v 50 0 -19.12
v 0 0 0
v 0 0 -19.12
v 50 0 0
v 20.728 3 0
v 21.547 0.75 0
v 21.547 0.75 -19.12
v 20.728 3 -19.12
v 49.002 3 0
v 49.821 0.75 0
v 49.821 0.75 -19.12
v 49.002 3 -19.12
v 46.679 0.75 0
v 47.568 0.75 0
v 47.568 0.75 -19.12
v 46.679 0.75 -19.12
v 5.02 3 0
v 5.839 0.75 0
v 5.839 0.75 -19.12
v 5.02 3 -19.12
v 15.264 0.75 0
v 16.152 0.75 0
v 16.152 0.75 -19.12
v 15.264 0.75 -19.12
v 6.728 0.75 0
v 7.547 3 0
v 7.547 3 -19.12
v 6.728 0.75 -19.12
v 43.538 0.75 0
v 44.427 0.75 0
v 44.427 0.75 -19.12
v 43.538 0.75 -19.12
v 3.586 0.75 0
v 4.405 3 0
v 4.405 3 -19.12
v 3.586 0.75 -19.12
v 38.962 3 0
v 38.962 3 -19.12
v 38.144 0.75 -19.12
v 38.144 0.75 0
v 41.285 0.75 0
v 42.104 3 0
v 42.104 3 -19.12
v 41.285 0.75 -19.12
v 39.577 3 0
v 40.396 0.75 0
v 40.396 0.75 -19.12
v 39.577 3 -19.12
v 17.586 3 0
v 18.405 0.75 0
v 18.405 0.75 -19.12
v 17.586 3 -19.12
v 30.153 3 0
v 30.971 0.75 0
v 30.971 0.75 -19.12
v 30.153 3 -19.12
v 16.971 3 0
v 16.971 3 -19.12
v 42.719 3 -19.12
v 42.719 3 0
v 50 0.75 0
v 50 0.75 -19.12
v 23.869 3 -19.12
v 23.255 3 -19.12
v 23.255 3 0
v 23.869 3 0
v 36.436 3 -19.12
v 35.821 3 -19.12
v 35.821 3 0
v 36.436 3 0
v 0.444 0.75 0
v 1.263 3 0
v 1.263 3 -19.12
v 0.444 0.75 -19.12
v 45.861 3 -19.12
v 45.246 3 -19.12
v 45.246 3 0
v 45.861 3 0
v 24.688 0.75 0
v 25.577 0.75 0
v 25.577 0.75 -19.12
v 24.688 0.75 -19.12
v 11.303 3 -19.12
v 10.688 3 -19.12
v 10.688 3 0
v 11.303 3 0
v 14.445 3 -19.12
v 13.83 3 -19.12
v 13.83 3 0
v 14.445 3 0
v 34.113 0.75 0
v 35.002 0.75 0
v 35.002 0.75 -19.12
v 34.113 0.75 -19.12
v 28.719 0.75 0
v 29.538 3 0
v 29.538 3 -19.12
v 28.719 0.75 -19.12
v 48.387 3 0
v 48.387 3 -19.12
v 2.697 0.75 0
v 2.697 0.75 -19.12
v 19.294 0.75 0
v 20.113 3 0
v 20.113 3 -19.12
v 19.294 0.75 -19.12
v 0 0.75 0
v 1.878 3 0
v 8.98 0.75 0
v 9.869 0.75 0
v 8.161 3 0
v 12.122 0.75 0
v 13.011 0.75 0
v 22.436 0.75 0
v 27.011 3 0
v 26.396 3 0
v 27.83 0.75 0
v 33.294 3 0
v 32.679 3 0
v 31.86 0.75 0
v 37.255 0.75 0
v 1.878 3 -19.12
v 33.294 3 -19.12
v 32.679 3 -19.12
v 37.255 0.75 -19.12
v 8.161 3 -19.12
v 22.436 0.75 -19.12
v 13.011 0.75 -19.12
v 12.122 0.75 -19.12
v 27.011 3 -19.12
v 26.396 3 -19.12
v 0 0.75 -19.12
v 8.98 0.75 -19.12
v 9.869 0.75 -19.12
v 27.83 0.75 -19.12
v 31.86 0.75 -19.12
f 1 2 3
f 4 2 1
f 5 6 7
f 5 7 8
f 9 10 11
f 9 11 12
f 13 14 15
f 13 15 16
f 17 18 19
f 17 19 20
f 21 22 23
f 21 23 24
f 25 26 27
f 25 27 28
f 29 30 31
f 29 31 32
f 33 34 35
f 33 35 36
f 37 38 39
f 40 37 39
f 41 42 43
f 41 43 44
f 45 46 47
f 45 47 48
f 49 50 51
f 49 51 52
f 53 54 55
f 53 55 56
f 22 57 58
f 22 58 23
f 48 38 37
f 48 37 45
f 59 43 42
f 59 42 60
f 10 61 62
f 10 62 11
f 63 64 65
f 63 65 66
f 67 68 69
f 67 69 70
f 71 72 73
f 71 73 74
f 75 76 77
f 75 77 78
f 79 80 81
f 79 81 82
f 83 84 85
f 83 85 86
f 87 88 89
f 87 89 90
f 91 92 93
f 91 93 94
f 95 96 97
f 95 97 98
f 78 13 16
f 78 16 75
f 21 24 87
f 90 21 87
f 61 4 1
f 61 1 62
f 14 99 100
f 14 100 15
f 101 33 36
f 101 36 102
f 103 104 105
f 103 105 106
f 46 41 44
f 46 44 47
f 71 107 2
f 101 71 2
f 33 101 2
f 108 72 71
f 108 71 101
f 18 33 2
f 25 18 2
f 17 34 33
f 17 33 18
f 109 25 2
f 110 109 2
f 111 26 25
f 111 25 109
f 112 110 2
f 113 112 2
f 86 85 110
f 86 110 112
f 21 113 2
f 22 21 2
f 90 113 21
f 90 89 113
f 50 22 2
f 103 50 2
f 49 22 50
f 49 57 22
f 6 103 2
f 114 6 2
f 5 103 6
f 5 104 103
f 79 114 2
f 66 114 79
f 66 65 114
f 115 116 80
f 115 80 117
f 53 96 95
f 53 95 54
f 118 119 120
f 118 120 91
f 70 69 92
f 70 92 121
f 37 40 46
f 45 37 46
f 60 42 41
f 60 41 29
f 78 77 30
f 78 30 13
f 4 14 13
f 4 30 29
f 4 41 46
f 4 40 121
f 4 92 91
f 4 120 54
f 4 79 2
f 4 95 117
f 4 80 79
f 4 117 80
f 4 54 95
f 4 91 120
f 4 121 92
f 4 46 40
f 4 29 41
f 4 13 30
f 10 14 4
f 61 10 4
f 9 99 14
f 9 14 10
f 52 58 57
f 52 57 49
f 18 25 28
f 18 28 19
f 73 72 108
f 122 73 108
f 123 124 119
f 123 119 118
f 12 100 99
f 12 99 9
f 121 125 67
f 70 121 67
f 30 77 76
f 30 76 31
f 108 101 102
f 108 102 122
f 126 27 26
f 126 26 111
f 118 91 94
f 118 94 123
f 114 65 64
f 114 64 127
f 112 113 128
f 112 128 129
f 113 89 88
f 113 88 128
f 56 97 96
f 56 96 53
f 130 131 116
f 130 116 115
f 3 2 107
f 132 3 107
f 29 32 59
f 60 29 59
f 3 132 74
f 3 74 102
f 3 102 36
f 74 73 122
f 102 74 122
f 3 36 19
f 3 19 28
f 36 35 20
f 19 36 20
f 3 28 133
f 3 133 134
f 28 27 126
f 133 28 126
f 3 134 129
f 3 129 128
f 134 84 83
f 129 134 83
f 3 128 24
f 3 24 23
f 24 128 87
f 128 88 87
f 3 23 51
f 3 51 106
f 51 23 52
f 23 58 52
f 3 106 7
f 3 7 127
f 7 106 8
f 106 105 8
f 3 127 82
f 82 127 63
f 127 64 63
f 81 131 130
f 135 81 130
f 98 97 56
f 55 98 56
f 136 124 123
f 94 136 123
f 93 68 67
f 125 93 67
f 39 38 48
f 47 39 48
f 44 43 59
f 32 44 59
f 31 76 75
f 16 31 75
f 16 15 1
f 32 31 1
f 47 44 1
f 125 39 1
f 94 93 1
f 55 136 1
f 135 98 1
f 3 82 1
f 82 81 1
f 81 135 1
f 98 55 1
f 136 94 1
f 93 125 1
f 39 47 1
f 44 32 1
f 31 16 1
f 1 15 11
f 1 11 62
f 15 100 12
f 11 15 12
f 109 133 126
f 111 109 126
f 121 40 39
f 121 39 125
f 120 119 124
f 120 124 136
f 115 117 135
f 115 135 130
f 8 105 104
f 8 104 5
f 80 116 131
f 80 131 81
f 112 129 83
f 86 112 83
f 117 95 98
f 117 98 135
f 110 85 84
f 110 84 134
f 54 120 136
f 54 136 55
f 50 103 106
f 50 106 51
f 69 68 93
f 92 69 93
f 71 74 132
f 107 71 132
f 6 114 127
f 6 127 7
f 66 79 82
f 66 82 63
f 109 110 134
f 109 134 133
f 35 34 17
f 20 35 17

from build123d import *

# Parameters (mm, degrees)
BLANKSKE_W        = 50
BLANKSKE_H        = 3
BLANK_DEPTH       = 19.12
TOOTHCUTSIM_DEPTH = 54.615057586
TEETHCUTS_COUNT   = 17
TEETHCUTS_PITCH   = 3.14159265


with BuildPart() as part:
    # BlankSke → Blank (new body)
    with BuildSketch(Plane.XY):
        with Locations((25, 1.5)):
            Rectangle(BLANKSKE_W, BLANKSKE_H)
    extrude(amount=-BLANK_DEPTH)

    # TooCutSkeSim → ToothCutSim (cut, through all)
    with BuildSketch(Plane.XY):
        Polygon((0.44443537, 0.75), (-0.44443537, 0.75), (-1.272613241, 3.0254), (1.272613241, 3.0254), align=None)
    toothcutsim = extrude(amount=-TOOTHCUTSIM_DEPTH, mode=Mode.SUBTRACT)

    # TeethCuts: ToothCutSim ×17
    with Locations(*[(i * TEETHCUTS_PITCH, 0, 0) for i in range(1, TEETHCUTS_COUNT)]):
        add(toothcutsim, mode=Mode.SUBTRACT)


solid = part.part
